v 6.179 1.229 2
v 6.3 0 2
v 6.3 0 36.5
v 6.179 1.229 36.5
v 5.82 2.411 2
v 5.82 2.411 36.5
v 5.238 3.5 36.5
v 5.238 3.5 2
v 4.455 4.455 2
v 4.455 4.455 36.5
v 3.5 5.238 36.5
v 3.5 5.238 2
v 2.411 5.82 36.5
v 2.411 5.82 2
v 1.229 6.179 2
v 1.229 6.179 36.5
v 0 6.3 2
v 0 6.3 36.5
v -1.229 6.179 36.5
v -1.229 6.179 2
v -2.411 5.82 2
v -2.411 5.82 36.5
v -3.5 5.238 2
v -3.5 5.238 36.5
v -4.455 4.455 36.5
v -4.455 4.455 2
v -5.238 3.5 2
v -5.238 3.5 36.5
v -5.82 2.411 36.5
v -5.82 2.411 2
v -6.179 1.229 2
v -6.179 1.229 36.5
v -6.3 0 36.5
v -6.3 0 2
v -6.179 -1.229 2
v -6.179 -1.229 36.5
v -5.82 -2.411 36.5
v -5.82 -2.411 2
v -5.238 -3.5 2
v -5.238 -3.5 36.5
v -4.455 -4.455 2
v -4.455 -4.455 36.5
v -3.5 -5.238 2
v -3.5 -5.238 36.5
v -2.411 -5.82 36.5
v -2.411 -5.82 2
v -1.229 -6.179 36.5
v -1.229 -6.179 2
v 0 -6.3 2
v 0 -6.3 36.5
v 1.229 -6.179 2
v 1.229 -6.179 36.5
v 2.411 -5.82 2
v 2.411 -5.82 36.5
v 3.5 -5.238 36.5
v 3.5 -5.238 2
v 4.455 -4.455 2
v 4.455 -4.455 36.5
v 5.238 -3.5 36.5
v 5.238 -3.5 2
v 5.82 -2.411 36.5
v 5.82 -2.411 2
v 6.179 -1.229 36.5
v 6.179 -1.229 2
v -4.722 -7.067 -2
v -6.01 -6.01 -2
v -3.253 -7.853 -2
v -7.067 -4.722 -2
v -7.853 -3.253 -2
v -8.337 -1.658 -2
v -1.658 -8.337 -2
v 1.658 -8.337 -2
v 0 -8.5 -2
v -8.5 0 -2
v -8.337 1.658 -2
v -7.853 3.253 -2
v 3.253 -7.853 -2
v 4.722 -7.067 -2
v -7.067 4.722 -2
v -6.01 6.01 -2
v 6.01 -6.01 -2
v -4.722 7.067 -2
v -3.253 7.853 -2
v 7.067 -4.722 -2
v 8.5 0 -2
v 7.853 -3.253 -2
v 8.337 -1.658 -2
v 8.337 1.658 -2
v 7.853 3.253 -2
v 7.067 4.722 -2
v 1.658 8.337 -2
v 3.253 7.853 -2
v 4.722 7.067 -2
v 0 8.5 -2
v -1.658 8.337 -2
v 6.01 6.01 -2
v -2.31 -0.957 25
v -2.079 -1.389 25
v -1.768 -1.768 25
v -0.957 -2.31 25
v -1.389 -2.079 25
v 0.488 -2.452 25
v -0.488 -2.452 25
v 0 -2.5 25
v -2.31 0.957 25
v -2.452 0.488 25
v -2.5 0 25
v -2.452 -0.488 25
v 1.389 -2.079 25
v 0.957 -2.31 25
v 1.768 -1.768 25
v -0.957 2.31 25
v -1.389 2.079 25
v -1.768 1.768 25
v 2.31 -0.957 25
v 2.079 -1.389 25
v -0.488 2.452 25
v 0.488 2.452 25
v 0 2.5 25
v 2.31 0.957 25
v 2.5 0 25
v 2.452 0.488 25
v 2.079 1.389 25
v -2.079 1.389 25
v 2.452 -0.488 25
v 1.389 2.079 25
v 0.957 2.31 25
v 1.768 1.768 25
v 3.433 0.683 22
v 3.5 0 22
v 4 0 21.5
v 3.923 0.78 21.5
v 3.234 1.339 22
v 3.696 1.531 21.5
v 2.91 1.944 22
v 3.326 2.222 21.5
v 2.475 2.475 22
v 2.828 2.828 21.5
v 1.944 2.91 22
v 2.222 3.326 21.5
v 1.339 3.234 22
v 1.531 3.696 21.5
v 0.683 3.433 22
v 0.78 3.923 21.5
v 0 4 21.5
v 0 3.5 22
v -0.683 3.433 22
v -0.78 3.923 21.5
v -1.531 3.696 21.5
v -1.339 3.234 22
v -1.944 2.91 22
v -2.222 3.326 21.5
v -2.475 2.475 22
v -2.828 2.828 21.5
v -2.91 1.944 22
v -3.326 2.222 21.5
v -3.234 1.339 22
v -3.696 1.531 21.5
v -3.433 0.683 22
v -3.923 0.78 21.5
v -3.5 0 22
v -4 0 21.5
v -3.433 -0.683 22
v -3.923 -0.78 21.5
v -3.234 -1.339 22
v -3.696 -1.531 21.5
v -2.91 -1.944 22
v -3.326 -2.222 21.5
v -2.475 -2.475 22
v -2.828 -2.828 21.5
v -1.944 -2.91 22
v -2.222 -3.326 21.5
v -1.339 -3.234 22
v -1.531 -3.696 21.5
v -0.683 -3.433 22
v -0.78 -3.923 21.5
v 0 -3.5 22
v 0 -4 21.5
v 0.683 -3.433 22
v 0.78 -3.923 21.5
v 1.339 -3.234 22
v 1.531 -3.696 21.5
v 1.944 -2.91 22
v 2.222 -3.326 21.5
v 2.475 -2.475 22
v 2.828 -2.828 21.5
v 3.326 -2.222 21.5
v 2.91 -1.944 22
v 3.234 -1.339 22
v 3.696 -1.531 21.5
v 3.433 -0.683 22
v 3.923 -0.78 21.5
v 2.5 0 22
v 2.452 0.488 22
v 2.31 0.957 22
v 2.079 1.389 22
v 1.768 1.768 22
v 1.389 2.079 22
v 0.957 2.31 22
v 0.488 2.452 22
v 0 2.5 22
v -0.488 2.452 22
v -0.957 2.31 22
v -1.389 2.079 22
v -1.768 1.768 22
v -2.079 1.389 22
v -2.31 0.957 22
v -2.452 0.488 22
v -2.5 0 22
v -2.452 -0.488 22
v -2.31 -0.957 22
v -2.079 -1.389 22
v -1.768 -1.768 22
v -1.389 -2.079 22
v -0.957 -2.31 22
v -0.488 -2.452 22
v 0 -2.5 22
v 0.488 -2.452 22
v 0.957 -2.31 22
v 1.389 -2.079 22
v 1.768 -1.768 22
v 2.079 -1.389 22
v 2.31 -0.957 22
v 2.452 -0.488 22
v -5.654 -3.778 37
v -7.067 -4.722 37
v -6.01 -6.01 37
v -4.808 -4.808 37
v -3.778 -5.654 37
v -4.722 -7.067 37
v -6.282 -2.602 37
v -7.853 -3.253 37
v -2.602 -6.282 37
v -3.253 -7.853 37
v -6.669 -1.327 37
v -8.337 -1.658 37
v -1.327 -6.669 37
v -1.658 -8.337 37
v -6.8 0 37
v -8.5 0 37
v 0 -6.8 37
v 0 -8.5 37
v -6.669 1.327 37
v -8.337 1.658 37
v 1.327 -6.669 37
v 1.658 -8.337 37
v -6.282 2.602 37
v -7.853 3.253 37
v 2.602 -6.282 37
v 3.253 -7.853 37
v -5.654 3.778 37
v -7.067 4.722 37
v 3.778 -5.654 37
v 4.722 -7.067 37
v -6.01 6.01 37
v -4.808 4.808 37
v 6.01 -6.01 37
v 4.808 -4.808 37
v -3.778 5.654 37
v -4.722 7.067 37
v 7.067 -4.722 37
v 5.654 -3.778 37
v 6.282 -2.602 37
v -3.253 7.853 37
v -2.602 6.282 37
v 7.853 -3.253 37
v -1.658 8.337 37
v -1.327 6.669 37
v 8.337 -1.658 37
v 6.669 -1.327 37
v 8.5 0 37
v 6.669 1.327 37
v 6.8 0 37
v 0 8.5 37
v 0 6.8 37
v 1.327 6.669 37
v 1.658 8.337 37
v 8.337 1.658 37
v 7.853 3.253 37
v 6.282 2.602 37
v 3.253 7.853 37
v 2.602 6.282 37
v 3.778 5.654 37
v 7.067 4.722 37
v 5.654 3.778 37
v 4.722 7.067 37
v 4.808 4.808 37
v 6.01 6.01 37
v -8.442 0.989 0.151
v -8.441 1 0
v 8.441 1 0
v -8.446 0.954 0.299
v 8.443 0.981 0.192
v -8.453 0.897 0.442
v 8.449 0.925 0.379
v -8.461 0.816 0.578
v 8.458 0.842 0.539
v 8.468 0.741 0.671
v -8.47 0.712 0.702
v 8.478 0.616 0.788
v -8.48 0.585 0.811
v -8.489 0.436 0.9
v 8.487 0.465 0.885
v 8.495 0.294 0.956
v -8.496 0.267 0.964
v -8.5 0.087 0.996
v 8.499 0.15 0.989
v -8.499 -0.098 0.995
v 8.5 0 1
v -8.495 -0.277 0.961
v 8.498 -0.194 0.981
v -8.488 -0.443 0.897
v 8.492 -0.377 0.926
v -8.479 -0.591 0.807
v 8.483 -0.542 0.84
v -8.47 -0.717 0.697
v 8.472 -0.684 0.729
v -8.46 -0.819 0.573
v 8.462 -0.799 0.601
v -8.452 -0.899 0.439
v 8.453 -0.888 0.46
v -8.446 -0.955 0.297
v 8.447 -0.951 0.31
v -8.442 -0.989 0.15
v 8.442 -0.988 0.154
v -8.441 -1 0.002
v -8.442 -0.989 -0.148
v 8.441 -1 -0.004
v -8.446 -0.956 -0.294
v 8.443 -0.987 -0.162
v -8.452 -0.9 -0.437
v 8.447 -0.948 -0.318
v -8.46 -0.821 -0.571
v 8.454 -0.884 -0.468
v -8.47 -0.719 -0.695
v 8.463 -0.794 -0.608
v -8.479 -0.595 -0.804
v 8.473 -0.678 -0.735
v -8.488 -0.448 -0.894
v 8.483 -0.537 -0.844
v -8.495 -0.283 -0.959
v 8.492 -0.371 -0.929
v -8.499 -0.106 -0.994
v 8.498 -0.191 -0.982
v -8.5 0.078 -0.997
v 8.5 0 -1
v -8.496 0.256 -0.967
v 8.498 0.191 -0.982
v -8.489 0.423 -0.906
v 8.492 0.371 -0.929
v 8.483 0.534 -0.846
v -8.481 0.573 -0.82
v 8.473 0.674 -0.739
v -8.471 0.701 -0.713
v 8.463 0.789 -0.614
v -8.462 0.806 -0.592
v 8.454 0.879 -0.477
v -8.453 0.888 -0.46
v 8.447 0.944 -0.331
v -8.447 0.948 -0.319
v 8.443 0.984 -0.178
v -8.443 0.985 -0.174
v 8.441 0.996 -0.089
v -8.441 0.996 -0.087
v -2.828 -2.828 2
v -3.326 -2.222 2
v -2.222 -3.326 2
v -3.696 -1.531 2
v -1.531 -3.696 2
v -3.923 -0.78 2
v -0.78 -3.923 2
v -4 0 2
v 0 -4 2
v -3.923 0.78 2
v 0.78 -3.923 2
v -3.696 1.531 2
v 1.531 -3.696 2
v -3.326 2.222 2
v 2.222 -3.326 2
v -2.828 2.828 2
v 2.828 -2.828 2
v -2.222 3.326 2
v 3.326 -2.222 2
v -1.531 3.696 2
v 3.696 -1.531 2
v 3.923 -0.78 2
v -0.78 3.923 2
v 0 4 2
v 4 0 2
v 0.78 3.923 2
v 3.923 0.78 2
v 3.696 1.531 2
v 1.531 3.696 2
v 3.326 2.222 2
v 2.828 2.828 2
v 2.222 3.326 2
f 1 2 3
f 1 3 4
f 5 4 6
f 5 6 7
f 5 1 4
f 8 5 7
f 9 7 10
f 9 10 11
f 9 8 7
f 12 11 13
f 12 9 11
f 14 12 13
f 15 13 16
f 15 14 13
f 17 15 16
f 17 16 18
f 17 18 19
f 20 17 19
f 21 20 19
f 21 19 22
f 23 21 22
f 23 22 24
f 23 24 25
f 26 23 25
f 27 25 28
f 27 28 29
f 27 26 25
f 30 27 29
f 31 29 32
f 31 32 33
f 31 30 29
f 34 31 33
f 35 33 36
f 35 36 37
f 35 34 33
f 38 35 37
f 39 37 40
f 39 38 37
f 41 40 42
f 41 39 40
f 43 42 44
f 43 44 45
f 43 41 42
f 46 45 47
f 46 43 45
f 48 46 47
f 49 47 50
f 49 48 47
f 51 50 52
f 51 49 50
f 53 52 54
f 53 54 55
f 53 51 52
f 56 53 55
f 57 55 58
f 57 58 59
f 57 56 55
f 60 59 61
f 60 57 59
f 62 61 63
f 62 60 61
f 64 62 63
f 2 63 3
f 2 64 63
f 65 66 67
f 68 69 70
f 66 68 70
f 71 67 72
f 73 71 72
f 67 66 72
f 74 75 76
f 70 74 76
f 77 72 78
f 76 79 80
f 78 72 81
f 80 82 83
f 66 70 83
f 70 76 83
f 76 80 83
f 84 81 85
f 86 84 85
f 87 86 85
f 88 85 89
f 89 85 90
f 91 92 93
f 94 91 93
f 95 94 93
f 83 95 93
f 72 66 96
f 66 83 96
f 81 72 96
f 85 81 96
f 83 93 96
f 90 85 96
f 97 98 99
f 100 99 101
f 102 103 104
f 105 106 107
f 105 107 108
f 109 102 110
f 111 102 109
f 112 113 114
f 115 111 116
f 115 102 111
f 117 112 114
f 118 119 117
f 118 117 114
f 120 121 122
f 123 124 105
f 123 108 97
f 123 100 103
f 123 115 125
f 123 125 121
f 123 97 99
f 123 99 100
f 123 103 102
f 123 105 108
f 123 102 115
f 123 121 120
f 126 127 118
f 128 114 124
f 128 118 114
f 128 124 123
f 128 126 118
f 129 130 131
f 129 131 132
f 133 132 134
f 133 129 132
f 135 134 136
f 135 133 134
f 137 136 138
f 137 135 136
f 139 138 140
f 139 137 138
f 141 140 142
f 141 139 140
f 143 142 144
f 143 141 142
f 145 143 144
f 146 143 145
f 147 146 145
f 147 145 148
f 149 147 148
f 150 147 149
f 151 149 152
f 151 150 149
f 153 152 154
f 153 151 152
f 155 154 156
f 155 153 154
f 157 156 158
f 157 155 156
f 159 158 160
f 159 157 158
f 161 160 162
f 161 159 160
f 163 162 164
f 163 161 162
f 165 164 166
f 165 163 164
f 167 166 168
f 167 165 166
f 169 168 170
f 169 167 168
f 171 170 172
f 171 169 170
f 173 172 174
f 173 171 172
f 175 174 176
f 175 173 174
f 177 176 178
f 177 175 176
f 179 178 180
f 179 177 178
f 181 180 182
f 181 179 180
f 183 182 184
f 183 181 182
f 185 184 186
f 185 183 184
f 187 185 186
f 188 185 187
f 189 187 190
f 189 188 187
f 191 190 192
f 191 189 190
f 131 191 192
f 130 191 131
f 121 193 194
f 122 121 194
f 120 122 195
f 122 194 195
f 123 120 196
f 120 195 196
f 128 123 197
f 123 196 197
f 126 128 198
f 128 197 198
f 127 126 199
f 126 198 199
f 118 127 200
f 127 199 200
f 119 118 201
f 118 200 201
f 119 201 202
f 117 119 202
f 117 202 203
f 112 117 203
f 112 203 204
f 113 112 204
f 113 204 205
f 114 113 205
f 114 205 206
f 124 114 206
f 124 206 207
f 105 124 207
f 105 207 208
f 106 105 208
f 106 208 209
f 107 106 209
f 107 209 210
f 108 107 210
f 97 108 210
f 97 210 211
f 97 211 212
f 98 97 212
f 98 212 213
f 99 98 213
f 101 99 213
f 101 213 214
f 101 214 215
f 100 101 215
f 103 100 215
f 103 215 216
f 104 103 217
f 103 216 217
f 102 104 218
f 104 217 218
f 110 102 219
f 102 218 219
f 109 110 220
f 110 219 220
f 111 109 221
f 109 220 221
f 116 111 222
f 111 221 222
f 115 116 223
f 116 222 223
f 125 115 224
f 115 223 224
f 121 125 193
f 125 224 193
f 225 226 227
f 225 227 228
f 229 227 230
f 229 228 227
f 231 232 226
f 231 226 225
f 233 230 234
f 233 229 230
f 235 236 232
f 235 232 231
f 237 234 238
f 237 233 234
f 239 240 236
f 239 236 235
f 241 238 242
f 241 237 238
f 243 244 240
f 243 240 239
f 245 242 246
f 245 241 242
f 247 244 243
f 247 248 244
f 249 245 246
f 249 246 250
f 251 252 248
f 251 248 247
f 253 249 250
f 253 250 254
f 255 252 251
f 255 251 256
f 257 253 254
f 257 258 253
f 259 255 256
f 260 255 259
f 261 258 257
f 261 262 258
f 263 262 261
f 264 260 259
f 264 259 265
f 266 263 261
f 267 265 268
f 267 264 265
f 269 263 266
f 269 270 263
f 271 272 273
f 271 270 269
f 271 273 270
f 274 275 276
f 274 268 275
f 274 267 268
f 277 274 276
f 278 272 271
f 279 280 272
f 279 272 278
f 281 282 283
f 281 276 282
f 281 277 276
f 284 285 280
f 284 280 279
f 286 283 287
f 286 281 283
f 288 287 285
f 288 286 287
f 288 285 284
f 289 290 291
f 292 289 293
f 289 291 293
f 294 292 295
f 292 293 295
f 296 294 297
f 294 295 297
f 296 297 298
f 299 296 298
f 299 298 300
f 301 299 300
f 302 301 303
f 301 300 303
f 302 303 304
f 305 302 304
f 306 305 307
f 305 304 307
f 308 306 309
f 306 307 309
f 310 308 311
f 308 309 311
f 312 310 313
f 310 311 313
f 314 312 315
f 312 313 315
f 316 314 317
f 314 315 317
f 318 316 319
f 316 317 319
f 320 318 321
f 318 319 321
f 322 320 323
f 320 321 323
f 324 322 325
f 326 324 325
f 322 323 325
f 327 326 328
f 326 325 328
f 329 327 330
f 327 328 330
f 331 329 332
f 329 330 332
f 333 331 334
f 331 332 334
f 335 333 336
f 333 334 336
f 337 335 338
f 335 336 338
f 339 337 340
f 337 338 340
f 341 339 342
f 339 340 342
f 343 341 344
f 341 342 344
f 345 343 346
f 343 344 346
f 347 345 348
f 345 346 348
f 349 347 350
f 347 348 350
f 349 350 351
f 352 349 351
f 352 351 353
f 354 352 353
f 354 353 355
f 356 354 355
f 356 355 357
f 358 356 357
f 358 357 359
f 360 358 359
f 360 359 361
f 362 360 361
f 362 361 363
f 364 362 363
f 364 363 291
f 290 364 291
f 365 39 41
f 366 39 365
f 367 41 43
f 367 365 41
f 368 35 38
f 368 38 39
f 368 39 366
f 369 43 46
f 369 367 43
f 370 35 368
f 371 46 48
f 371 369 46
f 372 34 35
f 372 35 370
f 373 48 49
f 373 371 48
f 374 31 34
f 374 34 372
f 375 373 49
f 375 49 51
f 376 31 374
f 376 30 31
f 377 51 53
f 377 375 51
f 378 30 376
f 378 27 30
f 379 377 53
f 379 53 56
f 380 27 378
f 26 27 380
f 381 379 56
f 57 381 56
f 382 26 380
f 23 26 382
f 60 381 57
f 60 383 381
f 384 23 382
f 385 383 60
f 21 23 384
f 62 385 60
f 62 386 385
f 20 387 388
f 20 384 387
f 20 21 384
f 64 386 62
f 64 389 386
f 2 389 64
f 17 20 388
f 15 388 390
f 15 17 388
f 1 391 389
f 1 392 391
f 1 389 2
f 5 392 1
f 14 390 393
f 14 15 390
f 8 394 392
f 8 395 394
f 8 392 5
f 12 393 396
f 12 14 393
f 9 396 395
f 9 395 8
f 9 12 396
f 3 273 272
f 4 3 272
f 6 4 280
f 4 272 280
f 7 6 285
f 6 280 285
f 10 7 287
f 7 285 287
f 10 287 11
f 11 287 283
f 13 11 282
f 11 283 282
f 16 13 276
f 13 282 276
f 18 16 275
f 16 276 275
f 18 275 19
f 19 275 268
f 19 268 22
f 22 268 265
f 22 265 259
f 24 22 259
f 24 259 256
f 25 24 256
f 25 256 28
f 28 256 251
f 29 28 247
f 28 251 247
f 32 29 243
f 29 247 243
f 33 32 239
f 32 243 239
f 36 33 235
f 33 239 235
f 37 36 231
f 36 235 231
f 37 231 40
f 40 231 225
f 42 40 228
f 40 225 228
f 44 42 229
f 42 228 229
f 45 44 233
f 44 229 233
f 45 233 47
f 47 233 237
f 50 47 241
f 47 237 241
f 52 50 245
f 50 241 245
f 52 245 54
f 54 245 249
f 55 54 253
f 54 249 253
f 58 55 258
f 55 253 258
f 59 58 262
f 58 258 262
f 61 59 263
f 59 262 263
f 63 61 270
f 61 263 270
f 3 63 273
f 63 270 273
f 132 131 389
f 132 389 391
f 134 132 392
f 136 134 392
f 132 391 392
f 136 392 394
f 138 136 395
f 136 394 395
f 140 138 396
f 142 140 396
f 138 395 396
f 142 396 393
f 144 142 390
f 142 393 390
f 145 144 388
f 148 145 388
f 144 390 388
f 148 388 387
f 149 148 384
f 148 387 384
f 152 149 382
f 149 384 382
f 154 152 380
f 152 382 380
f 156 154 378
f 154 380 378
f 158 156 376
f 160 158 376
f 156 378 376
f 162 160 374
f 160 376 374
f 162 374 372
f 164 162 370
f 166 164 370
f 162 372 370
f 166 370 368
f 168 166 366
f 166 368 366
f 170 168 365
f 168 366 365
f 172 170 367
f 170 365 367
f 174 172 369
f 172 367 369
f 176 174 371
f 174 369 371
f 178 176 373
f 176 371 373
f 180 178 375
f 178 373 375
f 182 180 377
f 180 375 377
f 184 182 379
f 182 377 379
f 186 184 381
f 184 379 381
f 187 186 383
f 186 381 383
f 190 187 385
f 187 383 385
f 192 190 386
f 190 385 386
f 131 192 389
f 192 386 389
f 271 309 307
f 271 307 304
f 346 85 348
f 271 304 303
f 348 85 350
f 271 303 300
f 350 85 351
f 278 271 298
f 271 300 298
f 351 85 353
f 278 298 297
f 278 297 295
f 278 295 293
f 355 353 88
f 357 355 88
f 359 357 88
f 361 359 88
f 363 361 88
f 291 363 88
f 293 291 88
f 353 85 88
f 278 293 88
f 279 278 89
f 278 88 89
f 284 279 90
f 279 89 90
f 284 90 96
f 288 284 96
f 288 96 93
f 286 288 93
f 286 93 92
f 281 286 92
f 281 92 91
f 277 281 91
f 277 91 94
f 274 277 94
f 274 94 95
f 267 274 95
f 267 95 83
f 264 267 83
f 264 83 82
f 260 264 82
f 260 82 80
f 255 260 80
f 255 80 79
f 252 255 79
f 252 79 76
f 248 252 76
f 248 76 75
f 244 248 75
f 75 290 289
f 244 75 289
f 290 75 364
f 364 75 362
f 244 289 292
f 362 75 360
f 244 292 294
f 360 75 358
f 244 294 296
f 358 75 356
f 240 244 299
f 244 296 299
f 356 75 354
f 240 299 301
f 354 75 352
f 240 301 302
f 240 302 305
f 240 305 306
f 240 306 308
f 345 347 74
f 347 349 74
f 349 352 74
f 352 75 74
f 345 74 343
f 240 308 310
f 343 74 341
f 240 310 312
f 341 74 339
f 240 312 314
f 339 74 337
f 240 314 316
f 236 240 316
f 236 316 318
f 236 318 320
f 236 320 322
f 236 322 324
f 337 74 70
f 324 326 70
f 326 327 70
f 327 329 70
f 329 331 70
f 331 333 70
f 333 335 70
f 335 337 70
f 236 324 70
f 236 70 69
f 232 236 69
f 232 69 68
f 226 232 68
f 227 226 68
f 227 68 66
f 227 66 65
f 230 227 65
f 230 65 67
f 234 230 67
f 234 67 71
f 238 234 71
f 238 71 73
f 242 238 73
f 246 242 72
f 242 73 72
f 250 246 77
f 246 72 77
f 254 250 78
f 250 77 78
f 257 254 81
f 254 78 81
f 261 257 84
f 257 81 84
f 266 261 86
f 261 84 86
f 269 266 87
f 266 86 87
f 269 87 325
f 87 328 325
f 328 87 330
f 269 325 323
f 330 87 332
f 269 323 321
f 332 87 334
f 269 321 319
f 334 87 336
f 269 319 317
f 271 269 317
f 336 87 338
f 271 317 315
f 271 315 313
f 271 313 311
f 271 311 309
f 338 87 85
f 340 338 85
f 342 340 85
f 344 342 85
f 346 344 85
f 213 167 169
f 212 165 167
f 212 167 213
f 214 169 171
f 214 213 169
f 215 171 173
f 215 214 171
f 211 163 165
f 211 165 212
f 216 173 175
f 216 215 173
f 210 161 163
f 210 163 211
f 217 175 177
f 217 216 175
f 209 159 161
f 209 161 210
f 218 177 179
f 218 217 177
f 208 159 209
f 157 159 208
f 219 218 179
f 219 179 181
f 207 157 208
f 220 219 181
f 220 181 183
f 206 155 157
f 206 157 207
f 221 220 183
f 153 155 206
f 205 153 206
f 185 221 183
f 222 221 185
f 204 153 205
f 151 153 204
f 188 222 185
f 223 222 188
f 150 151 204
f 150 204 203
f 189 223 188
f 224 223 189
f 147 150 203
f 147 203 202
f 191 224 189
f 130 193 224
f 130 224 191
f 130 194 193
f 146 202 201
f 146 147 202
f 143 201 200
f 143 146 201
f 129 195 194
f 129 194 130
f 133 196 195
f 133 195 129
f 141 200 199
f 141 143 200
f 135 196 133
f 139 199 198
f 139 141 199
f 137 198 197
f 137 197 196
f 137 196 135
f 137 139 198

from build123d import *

# Parameters (mm, degrees)
F0_R      = 8.5
F1_DEPTH  = 2
F2_R      = 4
F3_DEPTH  = 20
F4_R      = 8.5
F4_R_2    = 6.3
F5_DEPTH  = 35
F6_SIZE   = 0.5
F7_SIZE   = 0.5
F8_R      = 2.5
F9_DEPTH  = 25
F10_R     = 1
F11_DEPTH = 12.5


with BuildPart() as f1:
    # F0 (on Top) → F1 (new body, symmetric)
    with BuildSketch(Plane.XY):
        Circle(F0_R)
    extrude(amount=F1_DEPTH, both=True)

    # F2 (on face) → F3 (join)
    with BuildSketch(Plane.XY.offset(2)):
        Circle(F2_R)
    extrude(amount=F3_DEPTH)

    # F4 (on face) → F5 (join)
    with BuildSketch(Plane.XY.offset(2)):
        Circle(F4_R)
        Circle(F4_R_2, mode=Mode.SUBTRACT)
    extrude(amount=F5_DEPTH)

    # F6
    f6_edges = [f1.edges().sort_by_distance(p)[0] for p in [
        (-4, 0, 22),
    ]]
    chamfer(f6_edges, length=F6_SIZE)

    # F7
    f7_edges = [f1.edges().sort_by_distance(p)[0] for p in [
        (-6.3, 0, 37),
    ]]
    chamfer(f7_edges, length=F7_SIZE)

    # F8 (on Top) → F9 (join)
    with BuildSketch(Plane.XY):
        Circle(F8_R)
    extrude(amount=F9_DEPTH)

    # F10 (on Right) → F11 (cut, symmetric)
    with BuildSketch(Plane.YZ):
        Circle(F10_R)
    extrude(amount=F11_DEPTH, both=True, mode=Mode.SUBTRACT)


solid = f1.part
